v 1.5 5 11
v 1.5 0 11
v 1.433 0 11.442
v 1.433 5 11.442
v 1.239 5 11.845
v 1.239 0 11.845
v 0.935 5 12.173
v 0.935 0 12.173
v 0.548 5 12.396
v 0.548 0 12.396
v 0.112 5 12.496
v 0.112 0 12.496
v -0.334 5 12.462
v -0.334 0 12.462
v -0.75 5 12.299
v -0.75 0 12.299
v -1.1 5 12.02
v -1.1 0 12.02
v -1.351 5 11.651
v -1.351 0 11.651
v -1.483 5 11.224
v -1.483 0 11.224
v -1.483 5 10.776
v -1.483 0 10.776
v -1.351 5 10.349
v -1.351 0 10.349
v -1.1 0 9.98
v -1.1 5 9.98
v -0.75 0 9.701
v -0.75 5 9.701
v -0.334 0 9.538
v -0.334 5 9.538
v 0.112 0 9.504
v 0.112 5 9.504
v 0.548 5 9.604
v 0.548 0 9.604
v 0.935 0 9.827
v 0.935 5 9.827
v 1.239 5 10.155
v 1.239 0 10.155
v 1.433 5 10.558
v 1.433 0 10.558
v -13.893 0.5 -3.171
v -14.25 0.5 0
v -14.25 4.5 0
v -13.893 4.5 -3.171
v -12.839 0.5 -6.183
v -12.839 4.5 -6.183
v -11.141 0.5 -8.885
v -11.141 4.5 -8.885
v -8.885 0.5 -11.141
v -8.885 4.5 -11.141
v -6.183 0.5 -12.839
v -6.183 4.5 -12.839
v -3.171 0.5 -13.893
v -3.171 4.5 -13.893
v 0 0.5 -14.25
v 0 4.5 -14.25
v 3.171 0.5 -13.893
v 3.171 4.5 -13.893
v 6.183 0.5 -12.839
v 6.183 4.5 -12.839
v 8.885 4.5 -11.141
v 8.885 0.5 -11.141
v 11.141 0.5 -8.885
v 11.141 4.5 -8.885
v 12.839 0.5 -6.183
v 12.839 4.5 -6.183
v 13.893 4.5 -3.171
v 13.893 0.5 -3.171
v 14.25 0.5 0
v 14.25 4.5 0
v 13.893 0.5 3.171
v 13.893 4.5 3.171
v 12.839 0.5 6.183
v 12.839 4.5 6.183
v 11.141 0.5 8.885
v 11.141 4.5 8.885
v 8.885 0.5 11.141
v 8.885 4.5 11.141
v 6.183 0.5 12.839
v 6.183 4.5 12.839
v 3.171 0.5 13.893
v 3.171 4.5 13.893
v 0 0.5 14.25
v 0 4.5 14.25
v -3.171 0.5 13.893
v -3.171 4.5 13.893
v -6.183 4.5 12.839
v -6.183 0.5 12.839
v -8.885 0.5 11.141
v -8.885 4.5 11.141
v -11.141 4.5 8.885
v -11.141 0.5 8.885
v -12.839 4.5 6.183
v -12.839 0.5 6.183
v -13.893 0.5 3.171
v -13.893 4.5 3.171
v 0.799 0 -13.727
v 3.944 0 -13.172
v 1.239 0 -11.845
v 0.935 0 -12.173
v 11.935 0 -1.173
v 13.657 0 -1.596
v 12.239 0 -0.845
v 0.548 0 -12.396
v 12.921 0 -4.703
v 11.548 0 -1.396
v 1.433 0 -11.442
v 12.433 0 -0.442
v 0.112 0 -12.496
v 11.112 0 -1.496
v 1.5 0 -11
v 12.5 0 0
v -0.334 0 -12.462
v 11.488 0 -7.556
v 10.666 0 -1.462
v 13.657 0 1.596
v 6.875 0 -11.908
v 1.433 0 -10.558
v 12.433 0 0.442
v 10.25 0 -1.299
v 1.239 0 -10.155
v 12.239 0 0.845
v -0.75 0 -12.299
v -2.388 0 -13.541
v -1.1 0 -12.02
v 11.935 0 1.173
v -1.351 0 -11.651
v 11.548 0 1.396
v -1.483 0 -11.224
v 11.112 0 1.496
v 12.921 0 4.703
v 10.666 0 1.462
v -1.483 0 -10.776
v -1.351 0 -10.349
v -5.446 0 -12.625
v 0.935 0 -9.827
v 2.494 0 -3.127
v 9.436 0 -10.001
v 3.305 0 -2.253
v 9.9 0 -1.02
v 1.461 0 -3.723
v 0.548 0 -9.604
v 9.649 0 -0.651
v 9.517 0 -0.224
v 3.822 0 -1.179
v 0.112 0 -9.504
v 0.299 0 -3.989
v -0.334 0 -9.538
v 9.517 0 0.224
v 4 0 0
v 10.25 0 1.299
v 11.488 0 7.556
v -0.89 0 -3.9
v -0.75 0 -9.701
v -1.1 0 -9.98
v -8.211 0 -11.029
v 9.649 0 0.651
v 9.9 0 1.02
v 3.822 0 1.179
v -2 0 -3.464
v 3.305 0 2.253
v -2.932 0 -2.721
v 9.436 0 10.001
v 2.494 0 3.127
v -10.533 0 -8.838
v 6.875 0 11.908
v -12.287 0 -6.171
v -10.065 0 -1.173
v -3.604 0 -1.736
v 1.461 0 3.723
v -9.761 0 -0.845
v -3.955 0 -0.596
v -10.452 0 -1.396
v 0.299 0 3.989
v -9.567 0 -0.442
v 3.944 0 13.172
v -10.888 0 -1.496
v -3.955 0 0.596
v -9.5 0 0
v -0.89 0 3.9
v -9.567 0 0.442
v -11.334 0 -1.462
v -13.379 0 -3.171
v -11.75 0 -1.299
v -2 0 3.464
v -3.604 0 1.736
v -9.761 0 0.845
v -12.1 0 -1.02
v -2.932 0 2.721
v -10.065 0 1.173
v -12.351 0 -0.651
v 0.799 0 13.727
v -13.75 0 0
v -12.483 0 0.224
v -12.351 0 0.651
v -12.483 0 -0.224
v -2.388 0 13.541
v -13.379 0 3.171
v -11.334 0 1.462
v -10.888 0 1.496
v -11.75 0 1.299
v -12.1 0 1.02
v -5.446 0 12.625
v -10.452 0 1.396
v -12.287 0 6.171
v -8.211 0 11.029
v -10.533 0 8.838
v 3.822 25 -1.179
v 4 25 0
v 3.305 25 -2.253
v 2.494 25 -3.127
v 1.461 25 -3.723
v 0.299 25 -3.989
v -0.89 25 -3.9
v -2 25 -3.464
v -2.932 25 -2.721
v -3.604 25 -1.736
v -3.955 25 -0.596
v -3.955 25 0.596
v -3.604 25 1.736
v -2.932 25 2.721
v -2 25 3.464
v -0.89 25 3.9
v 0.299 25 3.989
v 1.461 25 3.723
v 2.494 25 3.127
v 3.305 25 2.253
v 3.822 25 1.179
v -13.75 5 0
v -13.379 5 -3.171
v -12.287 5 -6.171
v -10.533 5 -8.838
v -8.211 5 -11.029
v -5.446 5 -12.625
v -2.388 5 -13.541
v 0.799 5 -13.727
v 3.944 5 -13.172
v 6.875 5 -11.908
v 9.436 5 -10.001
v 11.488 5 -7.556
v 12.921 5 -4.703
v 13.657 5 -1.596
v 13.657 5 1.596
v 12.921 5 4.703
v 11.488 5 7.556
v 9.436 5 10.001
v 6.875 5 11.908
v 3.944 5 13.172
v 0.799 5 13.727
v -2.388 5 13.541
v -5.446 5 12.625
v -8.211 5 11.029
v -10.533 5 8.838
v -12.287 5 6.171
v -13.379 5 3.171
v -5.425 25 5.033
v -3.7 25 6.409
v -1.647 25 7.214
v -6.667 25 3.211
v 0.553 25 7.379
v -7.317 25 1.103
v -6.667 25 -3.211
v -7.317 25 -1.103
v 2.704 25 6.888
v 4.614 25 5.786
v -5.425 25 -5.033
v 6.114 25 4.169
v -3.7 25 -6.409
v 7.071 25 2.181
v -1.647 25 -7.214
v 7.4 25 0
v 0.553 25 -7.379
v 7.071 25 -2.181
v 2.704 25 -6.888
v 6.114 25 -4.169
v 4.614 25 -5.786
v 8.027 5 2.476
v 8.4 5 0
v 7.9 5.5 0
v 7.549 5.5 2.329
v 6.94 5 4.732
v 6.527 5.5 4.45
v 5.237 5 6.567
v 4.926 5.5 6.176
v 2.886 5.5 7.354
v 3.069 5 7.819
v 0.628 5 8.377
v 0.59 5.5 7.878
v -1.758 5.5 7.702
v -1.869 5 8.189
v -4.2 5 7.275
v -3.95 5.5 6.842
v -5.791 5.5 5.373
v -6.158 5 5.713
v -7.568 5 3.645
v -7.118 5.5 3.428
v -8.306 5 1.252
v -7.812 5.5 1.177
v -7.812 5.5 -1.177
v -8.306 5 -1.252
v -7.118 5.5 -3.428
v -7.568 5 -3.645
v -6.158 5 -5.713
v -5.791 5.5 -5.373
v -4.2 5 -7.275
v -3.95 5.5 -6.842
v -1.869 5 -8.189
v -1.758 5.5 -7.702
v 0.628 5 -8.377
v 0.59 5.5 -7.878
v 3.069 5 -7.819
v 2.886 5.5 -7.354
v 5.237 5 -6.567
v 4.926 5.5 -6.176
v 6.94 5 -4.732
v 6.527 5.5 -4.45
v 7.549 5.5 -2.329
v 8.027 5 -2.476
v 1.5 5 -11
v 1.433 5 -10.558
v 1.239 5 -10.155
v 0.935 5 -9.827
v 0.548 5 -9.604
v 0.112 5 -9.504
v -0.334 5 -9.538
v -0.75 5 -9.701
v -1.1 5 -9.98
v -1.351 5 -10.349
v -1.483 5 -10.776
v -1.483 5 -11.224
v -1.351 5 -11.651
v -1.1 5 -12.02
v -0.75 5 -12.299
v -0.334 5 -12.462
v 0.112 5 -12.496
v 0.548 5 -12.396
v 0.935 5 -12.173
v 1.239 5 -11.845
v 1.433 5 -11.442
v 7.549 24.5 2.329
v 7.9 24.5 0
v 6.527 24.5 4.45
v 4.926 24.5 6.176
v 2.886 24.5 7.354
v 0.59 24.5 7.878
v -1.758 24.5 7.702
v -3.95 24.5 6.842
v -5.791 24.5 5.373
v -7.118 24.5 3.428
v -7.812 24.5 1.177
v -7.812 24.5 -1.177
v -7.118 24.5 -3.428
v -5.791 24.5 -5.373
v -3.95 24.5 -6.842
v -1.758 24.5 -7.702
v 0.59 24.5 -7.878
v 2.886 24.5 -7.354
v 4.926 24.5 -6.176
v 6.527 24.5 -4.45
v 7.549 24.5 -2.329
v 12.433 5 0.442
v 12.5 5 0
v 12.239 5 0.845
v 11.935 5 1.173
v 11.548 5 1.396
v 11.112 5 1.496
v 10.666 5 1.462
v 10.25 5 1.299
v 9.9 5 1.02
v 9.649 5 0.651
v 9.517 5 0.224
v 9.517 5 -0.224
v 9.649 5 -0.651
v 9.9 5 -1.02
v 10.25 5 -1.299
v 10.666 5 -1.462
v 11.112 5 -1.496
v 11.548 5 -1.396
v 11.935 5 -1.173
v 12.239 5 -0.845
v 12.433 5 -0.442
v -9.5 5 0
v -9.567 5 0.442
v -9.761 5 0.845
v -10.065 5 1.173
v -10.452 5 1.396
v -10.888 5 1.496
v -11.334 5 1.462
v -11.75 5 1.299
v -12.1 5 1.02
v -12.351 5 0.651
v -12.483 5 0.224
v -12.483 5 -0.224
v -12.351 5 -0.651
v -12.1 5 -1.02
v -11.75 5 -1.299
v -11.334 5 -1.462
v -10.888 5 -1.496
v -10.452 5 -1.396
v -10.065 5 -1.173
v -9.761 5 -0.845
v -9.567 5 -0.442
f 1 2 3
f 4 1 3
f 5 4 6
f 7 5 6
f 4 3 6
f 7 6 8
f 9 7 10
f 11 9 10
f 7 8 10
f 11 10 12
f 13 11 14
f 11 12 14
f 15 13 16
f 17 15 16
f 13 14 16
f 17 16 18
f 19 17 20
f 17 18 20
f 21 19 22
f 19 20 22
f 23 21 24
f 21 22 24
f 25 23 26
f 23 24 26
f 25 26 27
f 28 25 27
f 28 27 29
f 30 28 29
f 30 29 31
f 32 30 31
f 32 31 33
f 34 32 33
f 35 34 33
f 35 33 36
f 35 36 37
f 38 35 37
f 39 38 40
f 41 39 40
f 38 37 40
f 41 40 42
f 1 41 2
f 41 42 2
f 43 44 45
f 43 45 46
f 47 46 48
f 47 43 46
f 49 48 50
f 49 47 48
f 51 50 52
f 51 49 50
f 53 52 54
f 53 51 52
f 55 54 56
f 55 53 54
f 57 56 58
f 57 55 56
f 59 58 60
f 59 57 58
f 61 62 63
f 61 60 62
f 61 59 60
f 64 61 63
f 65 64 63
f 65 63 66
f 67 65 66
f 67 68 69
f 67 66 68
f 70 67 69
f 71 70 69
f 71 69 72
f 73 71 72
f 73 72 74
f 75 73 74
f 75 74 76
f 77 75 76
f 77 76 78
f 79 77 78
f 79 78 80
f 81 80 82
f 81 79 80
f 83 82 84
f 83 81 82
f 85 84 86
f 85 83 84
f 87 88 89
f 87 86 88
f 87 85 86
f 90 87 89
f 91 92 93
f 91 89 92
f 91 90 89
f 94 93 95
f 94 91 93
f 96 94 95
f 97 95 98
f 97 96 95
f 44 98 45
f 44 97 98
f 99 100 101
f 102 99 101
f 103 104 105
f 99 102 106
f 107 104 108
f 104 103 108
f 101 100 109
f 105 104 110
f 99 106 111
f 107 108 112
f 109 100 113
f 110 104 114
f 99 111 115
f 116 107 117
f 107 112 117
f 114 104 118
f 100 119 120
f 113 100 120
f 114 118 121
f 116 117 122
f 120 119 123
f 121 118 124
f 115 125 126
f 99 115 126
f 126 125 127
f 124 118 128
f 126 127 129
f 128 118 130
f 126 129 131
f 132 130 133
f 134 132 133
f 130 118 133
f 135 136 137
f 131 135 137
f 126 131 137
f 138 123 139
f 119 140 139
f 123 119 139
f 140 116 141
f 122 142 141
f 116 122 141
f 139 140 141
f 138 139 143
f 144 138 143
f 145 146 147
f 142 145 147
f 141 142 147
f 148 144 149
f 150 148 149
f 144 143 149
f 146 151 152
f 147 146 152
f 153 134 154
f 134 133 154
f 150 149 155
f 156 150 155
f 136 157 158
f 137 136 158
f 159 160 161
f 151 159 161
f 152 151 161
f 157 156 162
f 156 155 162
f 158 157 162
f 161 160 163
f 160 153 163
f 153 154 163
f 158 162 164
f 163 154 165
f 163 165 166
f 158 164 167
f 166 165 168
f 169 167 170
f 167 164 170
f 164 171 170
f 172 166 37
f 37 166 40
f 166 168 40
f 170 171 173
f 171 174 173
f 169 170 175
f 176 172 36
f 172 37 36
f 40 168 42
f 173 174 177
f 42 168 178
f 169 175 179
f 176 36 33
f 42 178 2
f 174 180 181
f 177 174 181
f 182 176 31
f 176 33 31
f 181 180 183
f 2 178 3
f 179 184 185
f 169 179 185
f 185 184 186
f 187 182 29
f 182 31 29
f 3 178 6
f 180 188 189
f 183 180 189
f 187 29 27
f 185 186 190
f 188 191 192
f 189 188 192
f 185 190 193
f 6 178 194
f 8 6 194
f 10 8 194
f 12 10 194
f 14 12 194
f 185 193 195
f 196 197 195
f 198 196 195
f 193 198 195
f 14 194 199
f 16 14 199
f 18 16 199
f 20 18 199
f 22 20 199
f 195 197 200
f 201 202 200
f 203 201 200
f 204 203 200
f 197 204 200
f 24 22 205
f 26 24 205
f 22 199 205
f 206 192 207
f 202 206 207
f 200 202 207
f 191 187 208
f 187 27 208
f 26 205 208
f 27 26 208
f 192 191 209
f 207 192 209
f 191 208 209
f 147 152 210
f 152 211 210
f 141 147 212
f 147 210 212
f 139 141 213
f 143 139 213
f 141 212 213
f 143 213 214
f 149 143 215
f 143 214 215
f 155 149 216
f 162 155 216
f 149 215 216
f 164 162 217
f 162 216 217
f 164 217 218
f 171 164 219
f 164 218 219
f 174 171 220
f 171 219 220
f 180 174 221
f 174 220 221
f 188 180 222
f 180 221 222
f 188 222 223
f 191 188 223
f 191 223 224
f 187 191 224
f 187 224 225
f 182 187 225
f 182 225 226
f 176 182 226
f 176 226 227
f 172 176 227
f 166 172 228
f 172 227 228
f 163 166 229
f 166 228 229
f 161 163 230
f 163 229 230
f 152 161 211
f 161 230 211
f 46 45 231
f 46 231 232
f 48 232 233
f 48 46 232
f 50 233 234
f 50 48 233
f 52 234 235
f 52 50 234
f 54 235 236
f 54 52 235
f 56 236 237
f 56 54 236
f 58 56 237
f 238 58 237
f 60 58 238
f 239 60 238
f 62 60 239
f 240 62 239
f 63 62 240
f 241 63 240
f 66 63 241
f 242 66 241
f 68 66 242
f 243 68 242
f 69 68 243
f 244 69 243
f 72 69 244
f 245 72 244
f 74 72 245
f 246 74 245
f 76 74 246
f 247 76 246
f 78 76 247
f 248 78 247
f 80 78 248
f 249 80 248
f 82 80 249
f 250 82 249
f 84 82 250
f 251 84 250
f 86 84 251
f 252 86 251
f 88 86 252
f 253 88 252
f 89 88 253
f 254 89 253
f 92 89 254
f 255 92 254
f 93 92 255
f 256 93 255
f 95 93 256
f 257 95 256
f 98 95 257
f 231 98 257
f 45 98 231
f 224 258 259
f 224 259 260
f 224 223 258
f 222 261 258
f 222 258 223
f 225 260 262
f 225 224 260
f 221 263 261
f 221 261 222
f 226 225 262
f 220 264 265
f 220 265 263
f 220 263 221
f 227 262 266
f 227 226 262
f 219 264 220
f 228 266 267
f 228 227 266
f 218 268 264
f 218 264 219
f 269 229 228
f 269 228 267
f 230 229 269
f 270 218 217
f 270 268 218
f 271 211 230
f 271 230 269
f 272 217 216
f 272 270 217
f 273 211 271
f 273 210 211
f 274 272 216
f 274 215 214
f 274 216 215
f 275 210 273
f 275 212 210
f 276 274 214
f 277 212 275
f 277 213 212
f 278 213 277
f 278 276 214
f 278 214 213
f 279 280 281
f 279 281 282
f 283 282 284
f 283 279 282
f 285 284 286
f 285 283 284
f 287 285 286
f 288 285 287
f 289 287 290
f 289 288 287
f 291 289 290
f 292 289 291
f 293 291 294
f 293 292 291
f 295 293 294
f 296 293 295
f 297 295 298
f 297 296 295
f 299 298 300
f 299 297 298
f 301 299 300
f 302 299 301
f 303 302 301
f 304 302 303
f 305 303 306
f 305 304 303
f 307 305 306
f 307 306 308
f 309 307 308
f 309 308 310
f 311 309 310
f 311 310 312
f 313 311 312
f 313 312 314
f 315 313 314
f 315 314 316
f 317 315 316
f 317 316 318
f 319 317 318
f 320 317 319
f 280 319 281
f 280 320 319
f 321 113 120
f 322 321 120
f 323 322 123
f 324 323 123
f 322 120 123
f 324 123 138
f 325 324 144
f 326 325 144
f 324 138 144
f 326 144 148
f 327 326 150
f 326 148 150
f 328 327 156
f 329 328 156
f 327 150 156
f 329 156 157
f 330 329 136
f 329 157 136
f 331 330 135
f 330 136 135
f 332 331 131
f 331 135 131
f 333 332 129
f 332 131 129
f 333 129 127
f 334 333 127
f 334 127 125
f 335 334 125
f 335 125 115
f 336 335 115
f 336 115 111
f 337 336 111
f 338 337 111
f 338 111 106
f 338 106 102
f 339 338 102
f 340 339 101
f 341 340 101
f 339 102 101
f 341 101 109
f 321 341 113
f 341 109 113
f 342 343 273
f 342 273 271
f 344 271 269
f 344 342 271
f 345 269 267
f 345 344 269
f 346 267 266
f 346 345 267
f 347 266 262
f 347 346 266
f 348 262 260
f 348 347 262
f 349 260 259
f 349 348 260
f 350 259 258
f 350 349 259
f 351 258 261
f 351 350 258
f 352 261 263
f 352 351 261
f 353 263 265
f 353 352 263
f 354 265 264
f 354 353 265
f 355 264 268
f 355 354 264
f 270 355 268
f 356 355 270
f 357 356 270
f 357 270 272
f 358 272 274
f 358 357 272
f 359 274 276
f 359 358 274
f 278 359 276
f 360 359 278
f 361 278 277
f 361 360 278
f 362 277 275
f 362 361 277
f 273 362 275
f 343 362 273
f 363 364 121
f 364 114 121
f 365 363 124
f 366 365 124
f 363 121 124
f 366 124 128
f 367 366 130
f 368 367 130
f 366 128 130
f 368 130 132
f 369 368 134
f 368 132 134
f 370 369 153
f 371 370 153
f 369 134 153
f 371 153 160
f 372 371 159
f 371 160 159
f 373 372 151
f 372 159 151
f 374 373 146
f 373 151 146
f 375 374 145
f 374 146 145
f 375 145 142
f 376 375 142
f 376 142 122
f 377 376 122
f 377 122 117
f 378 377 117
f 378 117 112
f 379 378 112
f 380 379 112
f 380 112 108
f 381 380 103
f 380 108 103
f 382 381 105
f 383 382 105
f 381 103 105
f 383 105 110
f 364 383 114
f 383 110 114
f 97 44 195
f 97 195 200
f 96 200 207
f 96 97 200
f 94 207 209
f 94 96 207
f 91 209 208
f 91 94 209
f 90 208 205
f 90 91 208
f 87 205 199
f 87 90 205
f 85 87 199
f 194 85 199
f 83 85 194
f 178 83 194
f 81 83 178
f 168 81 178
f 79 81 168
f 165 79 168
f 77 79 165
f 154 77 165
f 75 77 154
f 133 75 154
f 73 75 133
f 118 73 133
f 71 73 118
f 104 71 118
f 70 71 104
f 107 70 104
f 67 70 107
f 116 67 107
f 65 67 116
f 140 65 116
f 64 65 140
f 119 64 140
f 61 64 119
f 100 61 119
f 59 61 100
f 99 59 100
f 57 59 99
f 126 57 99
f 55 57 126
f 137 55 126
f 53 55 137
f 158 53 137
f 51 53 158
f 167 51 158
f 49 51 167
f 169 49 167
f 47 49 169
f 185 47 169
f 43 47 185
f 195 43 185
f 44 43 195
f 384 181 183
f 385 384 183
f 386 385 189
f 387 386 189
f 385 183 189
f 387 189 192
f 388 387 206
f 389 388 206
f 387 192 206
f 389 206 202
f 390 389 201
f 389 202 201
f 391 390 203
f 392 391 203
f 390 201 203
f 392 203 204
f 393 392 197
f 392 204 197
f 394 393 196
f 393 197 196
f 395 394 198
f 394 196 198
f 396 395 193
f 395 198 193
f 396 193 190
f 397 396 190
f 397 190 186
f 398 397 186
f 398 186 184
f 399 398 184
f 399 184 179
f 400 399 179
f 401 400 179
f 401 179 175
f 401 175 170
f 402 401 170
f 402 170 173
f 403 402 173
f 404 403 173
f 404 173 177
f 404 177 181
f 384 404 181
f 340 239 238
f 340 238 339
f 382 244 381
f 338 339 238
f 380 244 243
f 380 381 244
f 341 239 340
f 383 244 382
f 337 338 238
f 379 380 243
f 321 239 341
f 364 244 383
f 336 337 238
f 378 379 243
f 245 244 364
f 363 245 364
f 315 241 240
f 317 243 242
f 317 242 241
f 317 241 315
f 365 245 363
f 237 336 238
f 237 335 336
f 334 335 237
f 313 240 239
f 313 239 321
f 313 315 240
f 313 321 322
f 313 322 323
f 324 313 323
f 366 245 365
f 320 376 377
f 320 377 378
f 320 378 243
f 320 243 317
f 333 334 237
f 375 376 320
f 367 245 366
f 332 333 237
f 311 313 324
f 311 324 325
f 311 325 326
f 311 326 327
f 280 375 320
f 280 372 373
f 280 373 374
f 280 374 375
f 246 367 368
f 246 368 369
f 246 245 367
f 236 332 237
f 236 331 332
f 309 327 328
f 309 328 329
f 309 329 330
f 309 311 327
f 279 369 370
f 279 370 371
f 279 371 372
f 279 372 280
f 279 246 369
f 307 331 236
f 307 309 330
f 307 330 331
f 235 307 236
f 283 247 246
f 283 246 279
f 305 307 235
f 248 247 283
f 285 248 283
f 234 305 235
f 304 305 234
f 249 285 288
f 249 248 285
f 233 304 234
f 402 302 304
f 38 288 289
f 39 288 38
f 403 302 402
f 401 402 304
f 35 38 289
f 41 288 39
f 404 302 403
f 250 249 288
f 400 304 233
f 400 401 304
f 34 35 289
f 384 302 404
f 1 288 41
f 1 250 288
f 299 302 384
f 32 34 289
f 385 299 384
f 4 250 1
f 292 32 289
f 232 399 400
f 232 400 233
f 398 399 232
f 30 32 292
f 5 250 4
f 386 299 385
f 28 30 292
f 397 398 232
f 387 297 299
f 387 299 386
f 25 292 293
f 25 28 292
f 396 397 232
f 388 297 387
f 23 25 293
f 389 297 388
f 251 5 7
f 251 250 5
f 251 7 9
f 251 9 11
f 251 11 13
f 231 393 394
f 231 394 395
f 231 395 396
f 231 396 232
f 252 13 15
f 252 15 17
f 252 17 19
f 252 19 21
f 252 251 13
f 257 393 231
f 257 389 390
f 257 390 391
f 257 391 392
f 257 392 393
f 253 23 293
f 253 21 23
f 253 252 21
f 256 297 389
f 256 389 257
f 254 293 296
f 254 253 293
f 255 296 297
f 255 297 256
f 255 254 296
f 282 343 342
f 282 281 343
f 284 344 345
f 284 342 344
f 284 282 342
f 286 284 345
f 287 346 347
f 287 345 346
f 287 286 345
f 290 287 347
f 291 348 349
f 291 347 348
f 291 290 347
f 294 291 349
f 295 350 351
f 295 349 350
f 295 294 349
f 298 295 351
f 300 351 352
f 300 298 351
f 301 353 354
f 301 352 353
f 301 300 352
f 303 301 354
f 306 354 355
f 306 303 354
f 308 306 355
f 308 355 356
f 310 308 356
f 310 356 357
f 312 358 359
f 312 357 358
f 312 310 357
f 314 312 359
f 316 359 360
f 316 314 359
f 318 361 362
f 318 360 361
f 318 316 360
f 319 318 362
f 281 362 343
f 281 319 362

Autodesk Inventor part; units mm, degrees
ref_plane "YZ Plane" through (0, 0, 0) normal (1, 0, 0) x (0, 1, 0)
ref_plane "XZ Plane" through (0, 0, 0) normal (0, 1, 0) x (-1, 0, 0)
ref_plane "XY Plane" through (0, 0, 0) normal (0, 0, 1) x (1, 0, 0)
sketch "Sketch1" plane through (0, 0, 0) normal (0, 1, 0) x (-1, 0, 0)
  circle A0 centre (0, 0) radius 14.25
  dimension "d0" = 28.5
extrude "Extrusion1" add sketch "Sketch1" along normal blind 5
sketch "Sketch2" plane through (0, 5, 0) normal (0, 1, 0) x (1, 0, 0)
  circle A0 centre (0, 0) radius 14.25 projected
  circle A1 centre (0, 0) radius 7.9
  dimension "d3" = 15.8
extrude "Extrusion2" add sketch "Sketch2" along normal blind 20 contours A1
sketch "Sketch3" plane through (0, 25, 0) normal (0, 1, 0) x (1, 0, 0)
  circle A0 centre (0, 0) radius 7.9 projected
  circle A1 centre (0, 0) radius 4
  dimension "d6" = 8
extrude "Extrusion3" cut sketch "Sketch3" against normal blind 25.6 contours A1
chamfer "Chamfer1" distance 0.5 angle 45 1 edges at (-7.9, 25, 0)
chamfer "Chamfer2" distance 0.5 angle 45 3 edges at (-7.9, 5, 0) (14.25, 5, 0) (14.25, 0, 0)
thread "Thread1" size "TR10x2" class "7H" standard "ISO Metric Trapezoidal Threads" full length
sketch "Sketch5" plane through (0, 0, 0) normal (0, -1, 0) x (1, 0, 0)
  circle A0 centre (0, 0) radius 4 projected
  circle A1 centre (0, 0) radius 13.75 projected
  line L0 (0, 0) -> (-13.75, 0) construction
  line L1 (0, 0) -> (13.75, 0) construction
  circle A2 centre (0, 0) radius 13.75 construction
  line L2 (0, 0) -> (0, 13.75) construction
  line L3 (0, 0) -> (0, -13.75) construction
  circle A3 centre (0, 11) radius 1.5
  circle A4 centre (11, 0) radius 1.5
  circle A5 centre (-11, 0) radius 1.5
  circle A6 centre (0, -11) radius 1.5
  dimension "d28" = 11
  dimension "d29" = 3
  dimension "d30" = 11
  dimension "d31" = 11
  dimension "d32" = 11
extrude "Extrusion5" cut sketch "Sketch5" against normal up to surface (5 mm away) contours A3 | A4 | A5 | A6
properties part number "ZACMENut" material "ABS Plastic"
